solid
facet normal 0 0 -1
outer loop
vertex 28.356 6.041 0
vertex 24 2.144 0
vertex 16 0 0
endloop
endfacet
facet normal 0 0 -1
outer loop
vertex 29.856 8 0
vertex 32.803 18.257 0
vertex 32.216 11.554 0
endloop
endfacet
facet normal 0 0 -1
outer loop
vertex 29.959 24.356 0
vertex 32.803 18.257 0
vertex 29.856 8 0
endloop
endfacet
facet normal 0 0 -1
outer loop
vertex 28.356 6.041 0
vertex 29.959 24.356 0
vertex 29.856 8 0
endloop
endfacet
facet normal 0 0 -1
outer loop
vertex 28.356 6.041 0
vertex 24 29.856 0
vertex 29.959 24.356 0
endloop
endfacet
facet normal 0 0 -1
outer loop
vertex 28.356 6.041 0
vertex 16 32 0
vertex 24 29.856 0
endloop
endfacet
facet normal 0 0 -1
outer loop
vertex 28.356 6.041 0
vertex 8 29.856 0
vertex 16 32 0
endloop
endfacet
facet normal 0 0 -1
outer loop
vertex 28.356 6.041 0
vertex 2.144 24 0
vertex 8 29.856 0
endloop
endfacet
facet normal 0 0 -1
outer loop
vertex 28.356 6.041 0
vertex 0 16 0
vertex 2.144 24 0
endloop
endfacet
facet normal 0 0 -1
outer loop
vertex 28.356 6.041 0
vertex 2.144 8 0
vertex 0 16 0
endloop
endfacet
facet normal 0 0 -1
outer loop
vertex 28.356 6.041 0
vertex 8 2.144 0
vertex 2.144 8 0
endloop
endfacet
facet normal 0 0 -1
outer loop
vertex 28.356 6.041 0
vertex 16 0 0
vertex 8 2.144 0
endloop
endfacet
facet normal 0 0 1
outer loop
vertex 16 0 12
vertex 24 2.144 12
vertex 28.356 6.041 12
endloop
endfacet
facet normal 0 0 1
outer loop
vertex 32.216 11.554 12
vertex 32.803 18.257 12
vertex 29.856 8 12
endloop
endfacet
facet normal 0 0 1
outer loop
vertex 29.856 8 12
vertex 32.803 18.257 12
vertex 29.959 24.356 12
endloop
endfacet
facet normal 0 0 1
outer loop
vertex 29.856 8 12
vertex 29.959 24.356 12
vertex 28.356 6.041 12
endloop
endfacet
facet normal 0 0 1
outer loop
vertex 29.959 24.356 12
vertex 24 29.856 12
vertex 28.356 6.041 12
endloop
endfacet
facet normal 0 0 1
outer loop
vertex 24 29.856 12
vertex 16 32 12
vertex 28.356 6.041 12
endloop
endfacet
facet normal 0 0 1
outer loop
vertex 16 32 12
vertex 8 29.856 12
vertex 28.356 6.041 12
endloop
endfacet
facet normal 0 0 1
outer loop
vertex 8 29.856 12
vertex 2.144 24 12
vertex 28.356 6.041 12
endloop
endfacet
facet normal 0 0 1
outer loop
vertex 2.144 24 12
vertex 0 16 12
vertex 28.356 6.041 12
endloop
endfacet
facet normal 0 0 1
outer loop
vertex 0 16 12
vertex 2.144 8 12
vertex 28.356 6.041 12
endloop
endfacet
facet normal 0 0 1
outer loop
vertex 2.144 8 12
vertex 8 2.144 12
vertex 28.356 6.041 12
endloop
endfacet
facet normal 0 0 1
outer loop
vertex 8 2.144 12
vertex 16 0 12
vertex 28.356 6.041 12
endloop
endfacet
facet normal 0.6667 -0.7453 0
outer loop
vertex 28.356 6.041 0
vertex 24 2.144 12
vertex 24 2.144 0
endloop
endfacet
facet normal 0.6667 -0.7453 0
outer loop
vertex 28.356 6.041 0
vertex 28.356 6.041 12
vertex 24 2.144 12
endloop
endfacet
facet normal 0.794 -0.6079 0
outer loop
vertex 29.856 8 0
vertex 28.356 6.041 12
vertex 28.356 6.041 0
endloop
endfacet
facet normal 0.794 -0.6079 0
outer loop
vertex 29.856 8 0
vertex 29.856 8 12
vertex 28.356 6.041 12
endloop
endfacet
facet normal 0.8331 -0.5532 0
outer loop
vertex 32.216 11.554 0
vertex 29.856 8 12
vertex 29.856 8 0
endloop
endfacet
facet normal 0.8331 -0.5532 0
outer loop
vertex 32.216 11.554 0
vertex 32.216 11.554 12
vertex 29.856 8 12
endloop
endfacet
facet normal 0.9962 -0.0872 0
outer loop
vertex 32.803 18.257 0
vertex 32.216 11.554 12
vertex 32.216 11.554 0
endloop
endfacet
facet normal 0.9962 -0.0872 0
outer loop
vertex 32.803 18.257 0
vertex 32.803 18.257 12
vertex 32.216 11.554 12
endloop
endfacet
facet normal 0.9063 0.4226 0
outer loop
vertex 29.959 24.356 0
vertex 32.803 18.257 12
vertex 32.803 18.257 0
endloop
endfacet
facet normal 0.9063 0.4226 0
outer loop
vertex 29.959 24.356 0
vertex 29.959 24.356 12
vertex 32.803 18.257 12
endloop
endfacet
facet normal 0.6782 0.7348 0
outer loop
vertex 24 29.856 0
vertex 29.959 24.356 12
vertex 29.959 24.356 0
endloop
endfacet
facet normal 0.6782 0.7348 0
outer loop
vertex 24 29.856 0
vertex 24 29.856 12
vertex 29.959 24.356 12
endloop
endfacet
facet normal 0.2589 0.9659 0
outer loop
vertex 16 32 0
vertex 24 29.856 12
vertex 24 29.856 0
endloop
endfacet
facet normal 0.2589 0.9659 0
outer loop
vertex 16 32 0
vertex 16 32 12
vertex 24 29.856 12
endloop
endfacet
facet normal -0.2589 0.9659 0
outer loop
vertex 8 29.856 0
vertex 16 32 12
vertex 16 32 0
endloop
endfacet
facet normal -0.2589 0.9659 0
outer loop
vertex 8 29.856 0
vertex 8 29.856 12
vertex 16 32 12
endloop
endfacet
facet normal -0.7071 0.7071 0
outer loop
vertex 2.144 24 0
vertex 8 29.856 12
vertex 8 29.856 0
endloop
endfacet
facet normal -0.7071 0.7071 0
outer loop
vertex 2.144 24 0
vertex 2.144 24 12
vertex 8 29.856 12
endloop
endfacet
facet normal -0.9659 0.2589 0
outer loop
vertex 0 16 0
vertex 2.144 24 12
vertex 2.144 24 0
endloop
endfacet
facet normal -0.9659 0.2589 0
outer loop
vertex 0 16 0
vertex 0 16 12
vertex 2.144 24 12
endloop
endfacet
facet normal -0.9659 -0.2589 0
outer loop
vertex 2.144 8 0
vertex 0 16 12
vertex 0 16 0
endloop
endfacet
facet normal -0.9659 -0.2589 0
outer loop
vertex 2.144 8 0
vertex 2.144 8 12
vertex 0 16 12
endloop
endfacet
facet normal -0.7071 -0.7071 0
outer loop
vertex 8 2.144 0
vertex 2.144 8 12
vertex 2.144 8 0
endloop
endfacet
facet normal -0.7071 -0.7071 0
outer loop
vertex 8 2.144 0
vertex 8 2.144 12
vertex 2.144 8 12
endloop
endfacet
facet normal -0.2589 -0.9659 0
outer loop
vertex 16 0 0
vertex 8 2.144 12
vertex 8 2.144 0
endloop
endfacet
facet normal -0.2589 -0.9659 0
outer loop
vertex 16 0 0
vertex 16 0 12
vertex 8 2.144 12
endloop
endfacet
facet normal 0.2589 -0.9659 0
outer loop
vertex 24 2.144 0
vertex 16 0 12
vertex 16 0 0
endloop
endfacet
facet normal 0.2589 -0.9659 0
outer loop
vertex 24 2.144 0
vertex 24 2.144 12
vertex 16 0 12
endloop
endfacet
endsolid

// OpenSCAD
$fn = 32;

// ----------------------------------------------------------------------
// Eccentric disc: egg, 12 mm thick
// ----------------------------------------------------------------------

// --- parameters (mm) ---
profile_height = 12;      // extrusion height
profile_points = 14;      // points of the closed outline

profile = [[0, 16], [2.144, 8], [8, 2.144], [16, 0], [24, 2.144], [28.356, 6.041], [29.856, 8], [32.216, 11.554], [32.803, 18.257], [29.959, 24.356], [24, 29.856], [16, 32], [8, 29.856], [2.144, 24]];  // single closed polygon, 14 points, counter clockwise

// --- the one profile operation ---
linear_extrude(height = profile_height) polygon(points = profile);
